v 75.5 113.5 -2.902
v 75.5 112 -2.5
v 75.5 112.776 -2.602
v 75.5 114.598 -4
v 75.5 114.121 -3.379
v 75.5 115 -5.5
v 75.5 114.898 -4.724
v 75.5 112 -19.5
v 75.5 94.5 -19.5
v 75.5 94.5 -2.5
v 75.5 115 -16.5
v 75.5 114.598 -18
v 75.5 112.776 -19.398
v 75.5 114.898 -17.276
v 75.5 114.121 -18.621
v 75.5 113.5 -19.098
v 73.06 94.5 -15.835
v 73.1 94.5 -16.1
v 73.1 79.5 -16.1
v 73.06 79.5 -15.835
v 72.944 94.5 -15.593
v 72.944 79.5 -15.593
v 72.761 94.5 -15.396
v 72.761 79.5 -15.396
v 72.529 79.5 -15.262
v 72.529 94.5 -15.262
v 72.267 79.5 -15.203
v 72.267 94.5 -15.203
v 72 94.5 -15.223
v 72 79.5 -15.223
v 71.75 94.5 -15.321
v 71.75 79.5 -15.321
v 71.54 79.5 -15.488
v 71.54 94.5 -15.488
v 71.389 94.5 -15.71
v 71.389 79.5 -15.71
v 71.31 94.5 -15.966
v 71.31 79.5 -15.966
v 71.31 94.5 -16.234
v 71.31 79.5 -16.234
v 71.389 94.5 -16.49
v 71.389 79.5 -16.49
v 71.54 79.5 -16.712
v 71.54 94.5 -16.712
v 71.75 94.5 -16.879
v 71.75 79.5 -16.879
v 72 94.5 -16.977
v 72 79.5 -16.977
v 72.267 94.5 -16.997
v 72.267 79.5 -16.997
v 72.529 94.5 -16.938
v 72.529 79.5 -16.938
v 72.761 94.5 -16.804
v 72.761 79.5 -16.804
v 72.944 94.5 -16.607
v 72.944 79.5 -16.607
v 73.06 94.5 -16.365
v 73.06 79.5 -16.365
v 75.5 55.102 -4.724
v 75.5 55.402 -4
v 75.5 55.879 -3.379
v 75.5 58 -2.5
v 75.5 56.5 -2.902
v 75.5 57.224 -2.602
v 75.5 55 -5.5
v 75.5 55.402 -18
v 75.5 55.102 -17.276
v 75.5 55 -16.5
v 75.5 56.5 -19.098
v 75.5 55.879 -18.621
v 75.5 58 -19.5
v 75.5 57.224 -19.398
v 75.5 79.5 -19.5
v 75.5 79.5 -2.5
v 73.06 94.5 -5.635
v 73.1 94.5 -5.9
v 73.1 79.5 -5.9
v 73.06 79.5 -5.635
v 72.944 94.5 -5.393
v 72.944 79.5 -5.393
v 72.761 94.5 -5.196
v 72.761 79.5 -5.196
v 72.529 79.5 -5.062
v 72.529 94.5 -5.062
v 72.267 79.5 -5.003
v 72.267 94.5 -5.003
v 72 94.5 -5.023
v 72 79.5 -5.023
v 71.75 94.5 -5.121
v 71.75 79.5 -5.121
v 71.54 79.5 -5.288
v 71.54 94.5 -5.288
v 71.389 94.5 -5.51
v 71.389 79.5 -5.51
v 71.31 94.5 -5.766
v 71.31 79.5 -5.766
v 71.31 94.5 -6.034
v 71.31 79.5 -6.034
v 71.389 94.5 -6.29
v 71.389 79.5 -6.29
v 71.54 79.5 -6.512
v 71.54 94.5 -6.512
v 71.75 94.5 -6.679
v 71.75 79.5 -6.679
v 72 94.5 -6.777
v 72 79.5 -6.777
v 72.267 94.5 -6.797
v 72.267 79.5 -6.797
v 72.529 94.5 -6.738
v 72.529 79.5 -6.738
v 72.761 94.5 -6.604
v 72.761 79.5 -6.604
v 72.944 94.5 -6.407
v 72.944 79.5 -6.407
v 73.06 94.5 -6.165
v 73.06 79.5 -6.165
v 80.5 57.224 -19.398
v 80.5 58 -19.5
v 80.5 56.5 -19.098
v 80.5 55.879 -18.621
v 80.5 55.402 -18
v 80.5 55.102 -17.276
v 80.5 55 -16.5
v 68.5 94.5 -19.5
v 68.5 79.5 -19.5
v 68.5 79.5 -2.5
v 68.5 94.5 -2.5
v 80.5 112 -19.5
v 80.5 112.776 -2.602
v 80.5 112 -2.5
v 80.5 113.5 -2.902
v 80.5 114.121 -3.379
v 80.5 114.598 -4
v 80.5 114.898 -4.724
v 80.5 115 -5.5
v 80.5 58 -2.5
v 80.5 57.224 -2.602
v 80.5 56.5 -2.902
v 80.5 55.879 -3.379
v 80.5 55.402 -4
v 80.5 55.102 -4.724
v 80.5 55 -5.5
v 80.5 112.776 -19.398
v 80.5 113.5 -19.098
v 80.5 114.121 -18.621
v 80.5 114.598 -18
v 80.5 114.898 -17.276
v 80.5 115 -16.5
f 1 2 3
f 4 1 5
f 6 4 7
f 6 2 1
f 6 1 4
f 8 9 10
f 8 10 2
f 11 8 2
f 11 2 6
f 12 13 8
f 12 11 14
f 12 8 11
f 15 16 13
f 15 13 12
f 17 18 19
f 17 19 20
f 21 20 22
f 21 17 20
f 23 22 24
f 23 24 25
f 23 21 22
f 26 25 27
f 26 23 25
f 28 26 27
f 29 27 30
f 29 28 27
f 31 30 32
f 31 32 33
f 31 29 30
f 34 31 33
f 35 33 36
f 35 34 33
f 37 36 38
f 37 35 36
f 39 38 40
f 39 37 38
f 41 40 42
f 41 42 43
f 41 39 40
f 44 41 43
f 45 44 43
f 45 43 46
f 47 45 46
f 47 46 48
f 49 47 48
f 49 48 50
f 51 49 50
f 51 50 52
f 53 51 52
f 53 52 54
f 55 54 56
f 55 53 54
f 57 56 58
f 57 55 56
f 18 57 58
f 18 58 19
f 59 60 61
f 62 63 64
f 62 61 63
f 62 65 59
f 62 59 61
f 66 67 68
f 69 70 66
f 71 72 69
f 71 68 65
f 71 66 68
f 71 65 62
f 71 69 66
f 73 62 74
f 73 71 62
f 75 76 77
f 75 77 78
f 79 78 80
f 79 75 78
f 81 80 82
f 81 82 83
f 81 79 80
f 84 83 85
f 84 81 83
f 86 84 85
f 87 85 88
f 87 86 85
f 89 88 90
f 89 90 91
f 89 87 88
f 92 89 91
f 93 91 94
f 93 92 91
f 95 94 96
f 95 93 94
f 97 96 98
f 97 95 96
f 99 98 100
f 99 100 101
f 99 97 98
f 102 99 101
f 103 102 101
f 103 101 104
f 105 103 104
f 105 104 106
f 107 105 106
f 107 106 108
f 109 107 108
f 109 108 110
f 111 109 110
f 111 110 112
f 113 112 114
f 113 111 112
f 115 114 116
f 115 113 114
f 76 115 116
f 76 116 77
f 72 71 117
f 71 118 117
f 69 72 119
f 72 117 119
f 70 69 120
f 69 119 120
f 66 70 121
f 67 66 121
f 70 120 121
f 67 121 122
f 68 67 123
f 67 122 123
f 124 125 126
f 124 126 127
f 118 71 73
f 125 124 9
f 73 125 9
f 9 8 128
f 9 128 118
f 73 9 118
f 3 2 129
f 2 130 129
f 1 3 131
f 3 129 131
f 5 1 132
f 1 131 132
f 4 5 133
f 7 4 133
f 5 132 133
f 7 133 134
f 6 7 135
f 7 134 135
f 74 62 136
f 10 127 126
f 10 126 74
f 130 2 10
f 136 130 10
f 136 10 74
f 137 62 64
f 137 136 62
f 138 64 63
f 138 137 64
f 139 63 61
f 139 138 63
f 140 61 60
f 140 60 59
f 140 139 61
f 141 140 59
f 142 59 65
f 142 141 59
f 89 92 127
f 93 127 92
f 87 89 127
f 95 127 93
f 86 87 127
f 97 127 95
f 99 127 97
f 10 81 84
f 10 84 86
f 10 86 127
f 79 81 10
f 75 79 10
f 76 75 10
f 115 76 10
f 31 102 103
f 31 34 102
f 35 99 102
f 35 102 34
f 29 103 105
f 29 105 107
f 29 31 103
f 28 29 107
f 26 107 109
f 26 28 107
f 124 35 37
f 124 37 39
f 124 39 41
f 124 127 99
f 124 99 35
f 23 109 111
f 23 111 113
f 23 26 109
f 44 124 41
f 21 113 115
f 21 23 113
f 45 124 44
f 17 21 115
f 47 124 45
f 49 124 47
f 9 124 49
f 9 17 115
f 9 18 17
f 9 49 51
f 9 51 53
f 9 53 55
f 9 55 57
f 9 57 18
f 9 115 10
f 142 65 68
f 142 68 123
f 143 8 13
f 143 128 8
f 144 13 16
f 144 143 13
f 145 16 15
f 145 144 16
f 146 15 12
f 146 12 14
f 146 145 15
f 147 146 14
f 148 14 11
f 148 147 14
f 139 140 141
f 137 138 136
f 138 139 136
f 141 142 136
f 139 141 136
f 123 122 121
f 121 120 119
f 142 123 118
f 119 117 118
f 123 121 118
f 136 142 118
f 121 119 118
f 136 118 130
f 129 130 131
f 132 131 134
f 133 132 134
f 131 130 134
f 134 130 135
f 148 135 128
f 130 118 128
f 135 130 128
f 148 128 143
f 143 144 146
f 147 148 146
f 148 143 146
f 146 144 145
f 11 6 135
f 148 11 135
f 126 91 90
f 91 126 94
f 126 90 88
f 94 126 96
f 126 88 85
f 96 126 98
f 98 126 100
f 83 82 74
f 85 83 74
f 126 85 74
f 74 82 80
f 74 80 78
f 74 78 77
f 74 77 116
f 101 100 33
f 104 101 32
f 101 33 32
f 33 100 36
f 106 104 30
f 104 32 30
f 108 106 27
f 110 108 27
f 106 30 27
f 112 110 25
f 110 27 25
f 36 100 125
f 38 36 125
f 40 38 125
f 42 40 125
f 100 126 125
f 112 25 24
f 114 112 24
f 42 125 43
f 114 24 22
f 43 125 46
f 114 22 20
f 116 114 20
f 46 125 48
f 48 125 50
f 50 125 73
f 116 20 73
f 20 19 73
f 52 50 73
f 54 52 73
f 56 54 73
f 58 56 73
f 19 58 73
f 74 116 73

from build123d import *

# Parameters (mm, degrees)
CYLINDER950_R          = 0.9
CYLINDER950_DEPTH      = 15
CYLINDER950_ROLL_ANGLE = 90
CYLINDER951_R          = 0.9
CYLINDER951_DEPTH      = 15
CYLINDER951_ROLL_ANGLE = 90
BOX558_W               = 5
BOX558_H               = 60
BOX558_DEPTH           = 17
BOX557_W               = 7
BOX557_H               = 15
BOX557_DEPTH           = 17
FILLET357_R            = 3


with BuildPart() as cylinder1101:
    # Cylinder950 → Cylinder950 (new body)
    with BuildSketch(Plane.XY):
        Circle(CYLINDER950_R)
    extrude(amount=CYLINDER950_DEPTH)


with BuildPart() as cylinder1101_1:
    # Cylinder950 roll: moved
    add(cylinder1101.part.rotate(Axis((0, 0, 0), (1, 0, 0)), CYLINDER950_ROLL_ANGLE))


with BuildPart() as cylinder1101_2:
    # Cylinder950 placement: moved
    add(cylinder1101_1.part.moved(Location((27, 85, -10.2))))


with BuildPart() as fusion596:
    # Cylinder951 → Cylinder951 (new body)
    with BuildSketch(Plane.XY):
        Circle(CYLINDER951_R)
    extrude(amount=CYLINDER951_DEPTH)


with BuildPart() as fusion596_1:
    # Cylinder951 roll: moved
    add(fusion596.part.rotate(Axis((0, 0, 0), (1, 0, 0)), CYLINDER951_ROLL_ANGLE))


with BuildPart() as fusion596_2:
    # Cylinder951 placement: moved
    add(fusion596_1.part.moved(Location((27, 85, 0))))

    # Fusion596: union Cylinder1101
    add(cylinder1101_2.part)


with BuildPart() as fusion596_3:
    # Fusion596 placement: moved
    add(fusion596_2.part.moved(Location((44.2, 9.5, -5.9))))


with BuildPart() as cube749:
    # Box558 → Box558 (new body)
    with BuildSketch(Plane(origin=(74.5, 55, -19.5), x_dir=(1, 0, 0), z_dir=(0, 0, 1))):
        with Locations((2.5, 30)):
            Rectangle(BOX558_W, BOX558_H)
    extrude(amount=BOX558_DEPTH)


with BuildPart() as steering_servo_rear_mount:
    # Box557 → Box557 (new body)
    with BuildSketch(Plane(origin=(67.5, 79.5, -19.5), x_dir=(1, 0, 0), z_dir=(0, 0, 1))):
        with Locations((3.5, 7.5)):
            Rectangle(BOX557_W, BOX557_H)
    extrude(amount=BOX557_DEPTH)

    # Fusion597: union Cube749
    add(cube749.part)

    # Cut695: cut Fusion596
    add(fusion596_3.part, mode=Mode.SUBTRACT)

    # Fillet357
    fillet357_edges = [steering_servo_rear_mount.edges().sort_by_distance(p)[0] for p in [
        (77, 55, -2.5),
        (77, 115, -2.5),
        (77, 115, -19.5),
        (77, 55, -19.5),
    ]]
    fillet(fillet357_edges, radius=FILLET357_R)


with BuildPart() as steering_servo_rear_mount_1:
    # Fillet357 placement: moved
    add(steering_servo_rear_mount.part.moved(Location((1, 0, 0))))


solid = steering_servo_rear_mount_1.part
